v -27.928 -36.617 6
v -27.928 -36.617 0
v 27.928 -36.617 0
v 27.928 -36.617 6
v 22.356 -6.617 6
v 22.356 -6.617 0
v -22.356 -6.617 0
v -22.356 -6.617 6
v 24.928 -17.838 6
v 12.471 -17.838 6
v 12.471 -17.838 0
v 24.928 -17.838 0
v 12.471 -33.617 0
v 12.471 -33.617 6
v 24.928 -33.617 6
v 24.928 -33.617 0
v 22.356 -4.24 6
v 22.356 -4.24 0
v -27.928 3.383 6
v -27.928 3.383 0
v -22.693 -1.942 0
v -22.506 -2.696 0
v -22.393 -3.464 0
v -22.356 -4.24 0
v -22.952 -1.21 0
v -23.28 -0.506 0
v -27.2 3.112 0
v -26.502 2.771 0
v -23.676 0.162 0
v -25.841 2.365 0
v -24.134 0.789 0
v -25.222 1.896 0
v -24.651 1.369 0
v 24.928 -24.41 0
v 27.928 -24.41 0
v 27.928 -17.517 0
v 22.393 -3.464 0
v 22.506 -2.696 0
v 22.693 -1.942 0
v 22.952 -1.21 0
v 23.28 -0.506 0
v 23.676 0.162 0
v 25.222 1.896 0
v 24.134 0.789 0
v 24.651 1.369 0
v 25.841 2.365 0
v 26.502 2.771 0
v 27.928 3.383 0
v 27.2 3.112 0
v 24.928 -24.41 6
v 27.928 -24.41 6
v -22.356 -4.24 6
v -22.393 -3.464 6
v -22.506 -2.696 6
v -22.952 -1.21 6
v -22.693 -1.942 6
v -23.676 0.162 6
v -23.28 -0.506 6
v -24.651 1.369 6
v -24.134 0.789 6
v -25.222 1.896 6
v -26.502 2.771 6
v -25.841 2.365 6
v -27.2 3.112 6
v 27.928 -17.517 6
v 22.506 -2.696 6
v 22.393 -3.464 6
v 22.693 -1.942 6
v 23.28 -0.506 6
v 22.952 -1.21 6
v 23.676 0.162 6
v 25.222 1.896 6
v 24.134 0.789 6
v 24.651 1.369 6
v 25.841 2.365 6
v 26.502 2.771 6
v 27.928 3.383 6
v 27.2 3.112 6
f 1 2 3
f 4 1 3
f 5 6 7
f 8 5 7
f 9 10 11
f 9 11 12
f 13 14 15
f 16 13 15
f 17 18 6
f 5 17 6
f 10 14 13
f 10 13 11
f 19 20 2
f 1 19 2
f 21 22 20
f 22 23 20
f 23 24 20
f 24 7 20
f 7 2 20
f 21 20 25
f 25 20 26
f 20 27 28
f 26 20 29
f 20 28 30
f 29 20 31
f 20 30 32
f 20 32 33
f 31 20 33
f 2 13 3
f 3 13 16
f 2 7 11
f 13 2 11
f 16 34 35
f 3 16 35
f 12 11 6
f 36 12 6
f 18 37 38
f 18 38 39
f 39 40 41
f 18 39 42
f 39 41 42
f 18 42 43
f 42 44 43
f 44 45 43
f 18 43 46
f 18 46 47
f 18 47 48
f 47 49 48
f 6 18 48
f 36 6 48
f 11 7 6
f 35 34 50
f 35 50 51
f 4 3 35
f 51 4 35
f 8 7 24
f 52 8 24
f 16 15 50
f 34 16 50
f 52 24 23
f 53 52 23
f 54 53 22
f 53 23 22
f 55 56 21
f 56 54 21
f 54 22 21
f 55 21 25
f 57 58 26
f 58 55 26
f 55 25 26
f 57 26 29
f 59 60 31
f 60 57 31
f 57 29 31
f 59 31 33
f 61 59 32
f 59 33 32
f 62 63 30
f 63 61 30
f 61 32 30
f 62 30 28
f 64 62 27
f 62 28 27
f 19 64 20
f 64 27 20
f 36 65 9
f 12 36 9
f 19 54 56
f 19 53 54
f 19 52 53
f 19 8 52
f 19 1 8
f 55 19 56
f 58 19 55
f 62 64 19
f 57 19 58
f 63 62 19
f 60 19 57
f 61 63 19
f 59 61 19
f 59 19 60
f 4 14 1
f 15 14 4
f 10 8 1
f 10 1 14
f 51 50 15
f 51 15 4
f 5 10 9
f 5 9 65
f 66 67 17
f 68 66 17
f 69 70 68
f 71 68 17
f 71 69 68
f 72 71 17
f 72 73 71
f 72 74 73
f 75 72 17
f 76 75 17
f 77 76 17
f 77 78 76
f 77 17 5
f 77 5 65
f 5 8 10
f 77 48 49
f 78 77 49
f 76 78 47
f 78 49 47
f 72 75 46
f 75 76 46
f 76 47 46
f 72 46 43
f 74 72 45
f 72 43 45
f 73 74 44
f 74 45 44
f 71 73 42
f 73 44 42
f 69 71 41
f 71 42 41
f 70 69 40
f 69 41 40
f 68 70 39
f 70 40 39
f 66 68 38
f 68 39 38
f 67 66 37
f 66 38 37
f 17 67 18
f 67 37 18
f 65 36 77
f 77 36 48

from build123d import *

# Parameters (mm, degrees)
BOSS_EXTRUDE1_DEPTH     = 6
FILLET7_R               = 8
FILLET8_R               = 8
SKETCH3_W               = 12.456838911
SKETCH3_H               = 15.77867169
CUT_EXTRUDE1_DEPTH      = 47.440976911
CUT_EXTRUDE2_DEPTH      = 47.440976911
CUT_EXTRUDE2_DEPTH_BACK = 47.440976911


with BuildPart() as part:
    # Sketch1 → Boss-Extrude1 (new body)
    with BuildSketch(Plane.XY):
        Polygon((-27.927868544, -36.616915423), (27.927868544, -36.616915423), (27.927868544, 3.383084577), (22.35572924, 3.383084577), (22.35572924, -6.616915423), (-22.35572924, -6.616915423), (-22.35572924, 3.383084577), (-27.927868544, 3.383084577), align=None)
    extrude(amount=BOSS_EXTRUDE1_DEPTH)

    # Fillet7
    # the kernel refuses this fillet: 8 mm, written as the material it takes off along each edge
    with BuildSketch(Plane(origin=(-22.35572924, 3.383084577, -19.056739693), x_dir=(0, -1, 0), z_dir=(0, 0, 1))) as fillet7_piece_1:
        with BuildLine():
            CenterArc((7.622695877, -8), FILLET7_R, 90, 72.333104018)
            Line((0, -5.572139303), (-0.152453918, -5.52358209))
            ThreePointArc((-0.152453918, -5.52358209), (-0.16, -2.786069652), (-0.16, 0))
            Line((-0.16, 0), (0, 0.16))
            Line((0, 0.16), (7.622695877, 0.16))
            Line((7.622695877, 0.16), (7.622695877, 0))
        make_face()
    extrude(amount=44.113479387, mode=Mode.SUBTRACT)

    # Fillet8
    # the kernel refuses this fillet: 8 mm, written as the material it takes off along each edge
    with BuildSketch(Plane(origin=(22.35572924, 3.383084577, -19.056739693), x_dir=(1, 0, 0), z_dir=(0, 0, 1))) as fillet8_piece_1:
        with BuildLine():
            CenterArc((8, -7.622695877), FILLET8_R, 107.666895982, 72.333104018)
            Line((0, -7.622695877), (-0.16, -7.622695877))
            Line((-0.16, -7.622695877), (-0.16, 0))
            Line((-0.16, 0), (0, 0.16))
            ThreePointArc((0, 0.16), (2.786069652, 0.16), (5.52358209, 0.152453918))
            Line((5.52358209, 0.152453918), (5.572139303, 0))
        make_face()
    extrude(amount=44.113479387, mode=Mode.SUBTRACT)

    # Sketch3 → Cut-Extrude1 (cut, through all)
    with BuildSketch(Plane.XY.offset(6)):
        with Locations((18.699449089, -25.727579578)):
            Rectangle(SKETCH3_W, SKETCH3_H)
    extrude(amount=-CUT_EXTRUDE1_DEPTH, mode=Mode.SUBTRACT)

    # Sketch4 → Cut-Extrude2 (cut, two sides: drawn at the far end of the back side and taken through both)
    with BuildSketch(Plane.XY.offset(6).offset(-CUT_EXTRUDE2_DEPTH_BACK)):
        Polygon((161.938614763, -3.164665246), (27.927868544, -17.516949699), (24.927868544, -17.838243733), (24.927868544, -24.410226663), (27.927868544, -24.410226663), (162.70497406, -24.410226663), (432.083990377, -14.69332112), (431.317631081, 6.552240297), align=None)
    extrude(amount=CUT_EXTRUDE2_DEPTH + CUT_EXTRUDE2_DEPTH_BACK, mode=Mode.SUBTRACT)


solid = part.part
